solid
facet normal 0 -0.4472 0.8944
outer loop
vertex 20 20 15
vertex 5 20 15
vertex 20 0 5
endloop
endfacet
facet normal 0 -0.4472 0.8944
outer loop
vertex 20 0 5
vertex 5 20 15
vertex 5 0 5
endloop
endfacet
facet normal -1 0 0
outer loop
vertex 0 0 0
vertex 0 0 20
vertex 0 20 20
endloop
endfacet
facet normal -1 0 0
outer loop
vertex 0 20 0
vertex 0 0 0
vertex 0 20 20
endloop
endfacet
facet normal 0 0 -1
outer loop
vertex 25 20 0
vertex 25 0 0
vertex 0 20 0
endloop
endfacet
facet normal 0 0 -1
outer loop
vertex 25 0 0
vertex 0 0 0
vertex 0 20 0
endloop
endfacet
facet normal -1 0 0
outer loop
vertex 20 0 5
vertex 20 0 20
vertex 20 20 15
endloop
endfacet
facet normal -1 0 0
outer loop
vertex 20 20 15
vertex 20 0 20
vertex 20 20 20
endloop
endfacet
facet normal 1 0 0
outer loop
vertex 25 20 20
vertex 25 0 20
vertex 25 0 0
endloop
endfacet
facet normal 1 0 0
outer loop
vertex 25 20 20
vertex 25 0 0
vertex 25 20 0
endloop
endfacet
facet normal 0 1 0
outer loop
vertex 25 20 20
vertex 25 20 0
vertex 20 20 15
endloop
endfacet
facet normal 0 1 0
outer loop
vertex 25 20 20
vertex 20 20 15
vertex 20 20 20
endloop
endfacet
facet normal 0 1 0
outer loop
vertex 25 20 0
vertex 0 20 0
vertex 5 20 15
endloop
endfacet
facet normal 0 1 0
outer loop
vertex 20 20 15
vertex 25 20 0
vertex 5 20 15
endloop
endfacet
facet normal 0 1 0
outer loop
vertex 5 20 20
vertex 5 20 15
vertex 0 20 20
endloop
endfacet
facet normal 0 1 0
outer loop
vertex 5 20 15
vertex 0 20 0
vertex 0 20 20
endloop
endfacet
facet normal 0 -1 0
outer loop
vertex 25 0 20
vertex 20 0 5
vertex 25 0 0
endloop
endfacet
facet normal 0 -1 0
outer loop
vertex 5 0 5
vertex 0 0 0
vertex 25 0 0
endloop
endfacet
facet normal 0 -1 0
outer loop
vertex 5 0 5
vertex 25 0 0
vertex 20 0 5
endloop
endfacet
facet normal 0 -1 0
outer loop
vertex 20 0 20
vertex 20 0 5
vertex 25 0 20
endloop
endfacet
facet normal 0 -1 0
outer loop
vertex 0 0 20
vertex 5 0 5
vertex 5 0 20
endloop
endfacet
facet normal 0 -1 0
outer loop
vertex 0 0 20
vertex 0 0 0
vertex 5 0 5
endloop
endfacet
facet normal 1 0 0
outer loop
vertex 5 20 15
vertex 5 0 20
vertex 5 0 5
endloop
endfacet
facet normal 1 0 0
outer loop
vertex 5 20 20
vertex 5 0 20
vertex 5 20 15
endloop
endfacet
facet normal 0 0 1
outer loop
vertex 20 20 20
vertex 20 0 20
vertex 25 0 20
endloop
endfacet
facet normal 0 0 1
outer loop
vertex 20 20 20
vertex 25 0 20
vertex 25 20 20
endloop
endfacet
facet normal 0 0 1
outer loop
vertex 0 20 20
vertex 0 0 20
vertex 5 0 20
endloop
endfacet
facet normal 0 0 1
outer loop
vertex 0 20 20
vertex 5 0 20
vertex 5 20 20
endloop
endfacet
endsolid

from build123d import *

# Parameters (mm, degrees)
F1_DEPTH = 20
F2_W     = 20
F2_H     = 20
F3_DEPTH = 5
F4_W     = 20
F4_H     = 20
F5_DEPTH = 5


with BuildPart() as f1:
    # F0 (on Right) → F1 (new body)
    with BuildSketch(Plane.YZ):
        Polygon((20, 15), (0, 5), (0, 0), (20, 0), align=None)
    extrude(amount=F1_DEPTH)

    # F2 (on Right) → F3 (join)
    with BuildSketch(Plane.YZ):
        with Locations((10, 10)):
            Rectangle(F2_W, F2_H)
    extrude(amount=F3_DEPTH)

    # F4 (on face) → F5 (join)
    with BuildSketch(Plane.YZ.offset(20)):
        with Locations((10, 10)):
            Rectangle(F4_W, F4_H)
    extrude(amount=F5_DEPTH)


solid = f1.part
